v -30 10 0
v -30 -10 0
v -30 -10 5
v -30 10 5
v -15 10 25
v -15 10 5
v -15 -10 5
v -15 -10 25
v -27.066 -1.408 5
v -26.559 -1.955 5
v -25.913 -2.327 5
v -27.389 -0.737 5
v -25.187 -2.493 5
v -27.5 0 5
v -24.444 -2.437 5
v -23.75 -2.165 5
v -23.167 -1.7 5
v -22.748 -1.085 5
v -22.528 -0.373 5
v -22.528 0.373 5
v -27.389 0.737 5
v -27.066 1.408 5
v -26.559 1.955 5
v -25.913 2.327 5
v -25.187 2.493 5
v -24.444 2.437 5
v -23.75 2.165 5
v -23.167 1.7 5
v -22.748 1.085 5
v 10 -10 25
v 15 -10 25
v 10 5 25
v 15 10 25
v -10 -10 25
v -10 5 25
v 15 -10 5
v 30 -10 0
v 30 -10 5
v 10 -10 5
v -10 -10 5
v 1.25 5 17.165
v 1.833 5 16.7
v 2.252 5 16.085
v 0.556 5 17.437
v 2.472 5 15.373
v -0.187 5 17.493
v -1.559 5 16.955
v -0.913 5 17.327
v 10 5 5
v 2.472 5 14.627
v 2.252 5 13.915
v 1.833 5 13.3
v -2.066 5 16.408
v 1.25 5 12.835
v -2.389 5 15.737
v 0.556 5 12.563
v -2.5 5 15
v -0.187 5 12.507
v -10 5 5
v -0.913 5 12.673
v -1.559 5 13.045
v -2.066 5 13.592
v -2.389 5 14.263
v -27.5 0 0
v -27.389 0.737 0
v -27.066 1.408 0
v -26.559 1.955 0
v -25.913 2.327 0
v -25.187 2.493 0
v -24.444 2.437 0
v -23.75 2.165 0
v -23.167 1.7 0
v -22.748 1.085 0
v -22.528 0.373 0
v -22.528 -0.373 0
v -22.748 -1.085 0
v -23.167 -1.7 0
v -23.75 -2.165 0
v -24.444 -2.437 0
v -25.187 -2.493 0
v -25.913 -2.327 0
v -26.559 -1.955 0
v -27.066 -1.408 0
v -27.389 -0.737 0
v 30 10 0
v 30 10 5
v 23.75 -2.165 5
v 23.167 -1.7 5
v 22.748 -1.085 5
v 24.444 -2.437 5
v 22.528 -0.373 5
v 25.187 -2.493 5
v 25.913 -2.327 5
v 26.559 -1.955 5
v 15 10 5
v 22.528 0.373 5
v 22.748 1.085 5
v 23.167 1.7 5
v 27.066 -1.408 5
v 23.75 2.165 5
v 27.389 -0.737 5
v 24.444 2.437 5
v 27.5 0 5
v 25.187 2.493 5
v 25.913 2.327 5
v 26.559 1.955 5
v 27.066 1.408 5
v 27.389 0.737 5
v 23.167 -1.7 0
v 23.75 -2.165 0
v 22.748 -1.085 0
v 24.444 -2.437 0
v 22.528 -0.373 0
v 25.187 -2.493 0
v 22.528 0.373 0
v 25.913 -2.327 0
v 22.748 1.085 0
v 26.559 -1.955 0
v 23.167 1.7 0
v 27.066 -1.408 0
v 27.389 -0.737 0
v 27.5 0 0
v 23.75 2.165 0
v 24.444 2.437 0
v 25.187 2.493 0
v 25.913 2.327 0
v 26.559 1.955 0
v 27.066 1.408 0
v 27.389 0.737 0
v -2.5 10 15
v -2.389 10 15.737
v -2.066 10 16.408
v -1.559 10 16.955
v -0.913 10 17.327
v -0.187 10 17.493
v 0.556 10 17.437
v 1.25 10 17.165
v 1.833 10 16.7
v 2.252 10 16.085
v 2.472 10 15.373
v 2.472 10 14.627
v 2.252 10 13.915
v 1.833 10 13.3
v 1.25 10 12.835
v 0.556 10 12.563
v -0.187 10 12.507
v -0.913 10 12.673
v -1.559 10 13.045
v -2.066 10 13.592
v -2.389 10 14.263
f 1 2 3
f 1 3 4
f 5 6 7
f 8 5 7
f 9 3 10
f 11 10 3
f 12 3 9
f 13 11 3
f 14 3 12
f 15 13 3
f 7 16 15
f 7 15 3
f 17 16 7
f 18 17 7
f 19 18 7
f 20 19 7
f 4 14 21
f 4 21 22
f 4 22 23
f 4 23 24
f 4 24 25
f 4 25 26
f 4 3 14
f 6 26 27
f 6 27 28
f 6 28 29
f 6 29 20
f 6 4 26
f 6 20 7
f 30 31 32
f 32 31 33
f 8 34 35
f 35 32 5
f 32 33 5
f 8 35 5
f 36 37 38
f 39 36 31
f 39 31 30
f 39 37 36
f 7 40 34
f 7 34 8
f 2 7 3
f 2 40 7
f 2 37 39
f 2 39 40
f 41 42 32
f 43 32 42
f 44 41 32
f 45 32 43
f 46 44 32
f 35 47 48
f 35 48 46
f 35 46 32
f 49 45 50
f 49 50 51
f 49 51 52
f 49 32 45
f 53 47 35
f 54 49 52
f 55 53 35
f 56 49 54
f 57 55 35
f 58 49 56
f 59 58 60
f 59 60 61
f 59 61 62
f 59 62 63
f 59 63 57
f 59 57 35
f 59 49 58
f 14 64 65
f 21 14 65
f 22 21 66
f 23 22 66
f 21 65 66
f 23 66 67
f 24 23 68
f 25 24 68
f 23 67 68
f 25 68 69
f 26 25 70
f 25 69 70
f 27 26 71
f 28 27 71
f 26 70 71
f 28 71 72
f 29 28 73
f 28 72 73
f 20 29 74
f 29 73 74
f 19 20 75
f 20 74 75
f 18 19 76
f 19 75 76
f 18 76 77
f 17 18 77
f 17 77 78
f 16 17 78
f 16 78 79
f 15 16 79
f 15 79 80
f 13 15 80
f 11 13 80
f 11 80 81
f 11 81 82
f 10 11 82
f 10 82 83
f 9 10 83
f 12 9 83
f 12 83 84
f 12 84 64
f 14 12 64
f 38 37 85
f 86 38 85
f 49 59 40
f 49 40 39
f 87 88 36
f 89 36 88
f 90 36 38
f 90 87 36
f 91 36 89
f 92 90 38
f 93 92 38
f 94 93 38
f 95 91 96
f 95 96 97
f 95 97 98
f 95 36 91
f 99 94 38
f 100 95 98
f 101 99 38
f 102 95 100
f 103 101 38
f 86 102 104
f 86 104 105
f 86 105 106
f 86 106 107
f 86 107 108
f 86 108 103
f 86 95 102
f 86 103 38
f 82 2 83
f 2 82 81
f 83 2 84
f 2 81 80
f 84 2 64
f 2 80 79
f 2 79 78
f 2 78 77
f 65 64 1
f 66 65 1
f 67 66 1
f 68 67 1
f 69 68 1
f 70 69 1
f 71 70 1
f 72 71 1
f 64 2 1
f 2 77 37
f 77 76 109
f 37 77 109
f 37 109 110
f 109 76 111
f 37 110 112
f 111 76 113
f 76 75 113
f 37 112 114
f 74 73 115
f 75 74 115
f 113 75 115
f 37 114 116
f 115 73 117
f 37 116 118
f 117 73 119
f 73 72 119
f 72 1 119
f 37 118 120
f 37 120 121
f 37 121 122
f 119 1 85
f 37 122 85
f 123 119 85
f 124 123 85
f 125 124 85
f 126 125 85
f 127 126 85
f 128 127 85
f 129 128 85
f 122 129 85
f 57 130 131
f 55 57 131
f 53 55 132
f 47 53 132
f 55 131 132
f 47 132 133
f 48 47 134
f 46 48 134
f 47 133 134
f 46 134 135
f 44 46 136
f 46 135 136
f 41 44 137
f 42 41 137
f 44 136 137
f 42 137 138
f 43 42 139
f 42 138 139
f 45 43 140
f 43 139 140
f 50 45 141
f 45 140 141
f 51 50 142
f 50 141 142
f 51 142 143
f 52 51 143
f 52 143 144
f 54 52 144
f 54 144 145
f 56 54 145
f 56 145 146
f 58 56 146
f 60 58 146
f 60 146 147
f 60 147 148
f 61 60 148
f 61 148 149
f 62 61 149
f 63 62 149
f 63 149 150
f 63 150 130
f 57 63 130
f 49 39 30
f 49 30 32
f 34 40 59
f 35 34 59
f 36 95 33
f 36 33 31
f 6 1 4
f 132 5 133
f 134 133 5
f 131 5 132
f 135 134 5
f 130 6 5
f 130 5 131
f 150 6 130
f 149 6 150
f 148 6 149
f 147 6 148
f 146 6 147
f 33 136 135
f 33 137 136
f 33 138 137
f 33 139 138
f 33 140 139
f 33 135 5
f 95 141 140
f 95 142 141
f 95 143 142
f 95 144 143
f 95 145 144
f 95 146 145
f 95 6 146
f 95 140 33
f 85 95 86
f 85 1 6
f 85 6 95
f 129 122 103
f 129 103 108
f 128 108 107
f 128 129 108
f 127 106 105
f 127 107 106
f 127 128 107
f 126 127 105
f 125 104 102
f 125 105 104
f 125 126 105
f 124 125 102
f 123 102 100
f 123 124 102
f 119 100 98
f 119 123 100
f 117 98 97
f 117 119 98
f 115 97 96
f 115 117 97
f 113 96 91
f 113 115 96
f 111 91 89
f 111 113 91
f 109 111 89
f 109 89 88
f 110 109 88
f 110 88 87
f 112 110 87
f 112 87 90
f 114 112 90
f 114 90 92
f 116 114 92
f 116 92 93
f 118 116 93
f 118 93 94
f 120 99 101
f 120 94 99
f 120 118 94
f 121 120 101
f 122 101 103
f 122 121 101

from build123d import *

# Parameters (mm, degrees)
F0_W     = 60
F0_H     = 20
F1_DEPTH = 5
F3_DEPTH = 20
F5_D     = 5
F7_D     = 5


# Not quite as in the source:
# - a pattern or mirror of a feature is missing from the dataset's text; its kind, count and spacing are read off the source's solid


with BuildPart() as f1:
    # F0 (on Top) → F1 (new body)
    with BuildSketch(Plane.XY):
        Rectangle(F0_W, F0_H)
    extrude(amount=F1_DEPTH)

    # F2 (on face) → F3 (join)
    with BuildSketch(Plane.XY.offset(5)):
        Polygon((-15, 10), (-15, -10), (-10, -10), (-10, 5), (0, 5), (0, 10), align=None)
    f3 = extrude(amount=F3_DEPTH)

    # F3_copies: F3 across plane
    add(f3.mirror(Plane(origin=(0, 0, 0), x_dir=(0, 0, 1), z_dir=(1, 0, 0))))

    # F5 (through all)
    with Locations(Plane.XY.offset(5)):
        with Locations((-25, 0)):
            f5 = Hole(F5_D / 2)

    # F5_copies: F5 across plane
    add(f5.mirror(Plane(origin=(0, 0, 0), x_dir=(0, 0, 1), z_dir=(1, 0, 0))), mode=Mode.SUBTRACT)

    # F7 (through all)
    with Locations(Plane.XZ.offset(-5)):
        with Locations((0, 15)):
            Hole(F7_D / 2)


solid = f1.part
